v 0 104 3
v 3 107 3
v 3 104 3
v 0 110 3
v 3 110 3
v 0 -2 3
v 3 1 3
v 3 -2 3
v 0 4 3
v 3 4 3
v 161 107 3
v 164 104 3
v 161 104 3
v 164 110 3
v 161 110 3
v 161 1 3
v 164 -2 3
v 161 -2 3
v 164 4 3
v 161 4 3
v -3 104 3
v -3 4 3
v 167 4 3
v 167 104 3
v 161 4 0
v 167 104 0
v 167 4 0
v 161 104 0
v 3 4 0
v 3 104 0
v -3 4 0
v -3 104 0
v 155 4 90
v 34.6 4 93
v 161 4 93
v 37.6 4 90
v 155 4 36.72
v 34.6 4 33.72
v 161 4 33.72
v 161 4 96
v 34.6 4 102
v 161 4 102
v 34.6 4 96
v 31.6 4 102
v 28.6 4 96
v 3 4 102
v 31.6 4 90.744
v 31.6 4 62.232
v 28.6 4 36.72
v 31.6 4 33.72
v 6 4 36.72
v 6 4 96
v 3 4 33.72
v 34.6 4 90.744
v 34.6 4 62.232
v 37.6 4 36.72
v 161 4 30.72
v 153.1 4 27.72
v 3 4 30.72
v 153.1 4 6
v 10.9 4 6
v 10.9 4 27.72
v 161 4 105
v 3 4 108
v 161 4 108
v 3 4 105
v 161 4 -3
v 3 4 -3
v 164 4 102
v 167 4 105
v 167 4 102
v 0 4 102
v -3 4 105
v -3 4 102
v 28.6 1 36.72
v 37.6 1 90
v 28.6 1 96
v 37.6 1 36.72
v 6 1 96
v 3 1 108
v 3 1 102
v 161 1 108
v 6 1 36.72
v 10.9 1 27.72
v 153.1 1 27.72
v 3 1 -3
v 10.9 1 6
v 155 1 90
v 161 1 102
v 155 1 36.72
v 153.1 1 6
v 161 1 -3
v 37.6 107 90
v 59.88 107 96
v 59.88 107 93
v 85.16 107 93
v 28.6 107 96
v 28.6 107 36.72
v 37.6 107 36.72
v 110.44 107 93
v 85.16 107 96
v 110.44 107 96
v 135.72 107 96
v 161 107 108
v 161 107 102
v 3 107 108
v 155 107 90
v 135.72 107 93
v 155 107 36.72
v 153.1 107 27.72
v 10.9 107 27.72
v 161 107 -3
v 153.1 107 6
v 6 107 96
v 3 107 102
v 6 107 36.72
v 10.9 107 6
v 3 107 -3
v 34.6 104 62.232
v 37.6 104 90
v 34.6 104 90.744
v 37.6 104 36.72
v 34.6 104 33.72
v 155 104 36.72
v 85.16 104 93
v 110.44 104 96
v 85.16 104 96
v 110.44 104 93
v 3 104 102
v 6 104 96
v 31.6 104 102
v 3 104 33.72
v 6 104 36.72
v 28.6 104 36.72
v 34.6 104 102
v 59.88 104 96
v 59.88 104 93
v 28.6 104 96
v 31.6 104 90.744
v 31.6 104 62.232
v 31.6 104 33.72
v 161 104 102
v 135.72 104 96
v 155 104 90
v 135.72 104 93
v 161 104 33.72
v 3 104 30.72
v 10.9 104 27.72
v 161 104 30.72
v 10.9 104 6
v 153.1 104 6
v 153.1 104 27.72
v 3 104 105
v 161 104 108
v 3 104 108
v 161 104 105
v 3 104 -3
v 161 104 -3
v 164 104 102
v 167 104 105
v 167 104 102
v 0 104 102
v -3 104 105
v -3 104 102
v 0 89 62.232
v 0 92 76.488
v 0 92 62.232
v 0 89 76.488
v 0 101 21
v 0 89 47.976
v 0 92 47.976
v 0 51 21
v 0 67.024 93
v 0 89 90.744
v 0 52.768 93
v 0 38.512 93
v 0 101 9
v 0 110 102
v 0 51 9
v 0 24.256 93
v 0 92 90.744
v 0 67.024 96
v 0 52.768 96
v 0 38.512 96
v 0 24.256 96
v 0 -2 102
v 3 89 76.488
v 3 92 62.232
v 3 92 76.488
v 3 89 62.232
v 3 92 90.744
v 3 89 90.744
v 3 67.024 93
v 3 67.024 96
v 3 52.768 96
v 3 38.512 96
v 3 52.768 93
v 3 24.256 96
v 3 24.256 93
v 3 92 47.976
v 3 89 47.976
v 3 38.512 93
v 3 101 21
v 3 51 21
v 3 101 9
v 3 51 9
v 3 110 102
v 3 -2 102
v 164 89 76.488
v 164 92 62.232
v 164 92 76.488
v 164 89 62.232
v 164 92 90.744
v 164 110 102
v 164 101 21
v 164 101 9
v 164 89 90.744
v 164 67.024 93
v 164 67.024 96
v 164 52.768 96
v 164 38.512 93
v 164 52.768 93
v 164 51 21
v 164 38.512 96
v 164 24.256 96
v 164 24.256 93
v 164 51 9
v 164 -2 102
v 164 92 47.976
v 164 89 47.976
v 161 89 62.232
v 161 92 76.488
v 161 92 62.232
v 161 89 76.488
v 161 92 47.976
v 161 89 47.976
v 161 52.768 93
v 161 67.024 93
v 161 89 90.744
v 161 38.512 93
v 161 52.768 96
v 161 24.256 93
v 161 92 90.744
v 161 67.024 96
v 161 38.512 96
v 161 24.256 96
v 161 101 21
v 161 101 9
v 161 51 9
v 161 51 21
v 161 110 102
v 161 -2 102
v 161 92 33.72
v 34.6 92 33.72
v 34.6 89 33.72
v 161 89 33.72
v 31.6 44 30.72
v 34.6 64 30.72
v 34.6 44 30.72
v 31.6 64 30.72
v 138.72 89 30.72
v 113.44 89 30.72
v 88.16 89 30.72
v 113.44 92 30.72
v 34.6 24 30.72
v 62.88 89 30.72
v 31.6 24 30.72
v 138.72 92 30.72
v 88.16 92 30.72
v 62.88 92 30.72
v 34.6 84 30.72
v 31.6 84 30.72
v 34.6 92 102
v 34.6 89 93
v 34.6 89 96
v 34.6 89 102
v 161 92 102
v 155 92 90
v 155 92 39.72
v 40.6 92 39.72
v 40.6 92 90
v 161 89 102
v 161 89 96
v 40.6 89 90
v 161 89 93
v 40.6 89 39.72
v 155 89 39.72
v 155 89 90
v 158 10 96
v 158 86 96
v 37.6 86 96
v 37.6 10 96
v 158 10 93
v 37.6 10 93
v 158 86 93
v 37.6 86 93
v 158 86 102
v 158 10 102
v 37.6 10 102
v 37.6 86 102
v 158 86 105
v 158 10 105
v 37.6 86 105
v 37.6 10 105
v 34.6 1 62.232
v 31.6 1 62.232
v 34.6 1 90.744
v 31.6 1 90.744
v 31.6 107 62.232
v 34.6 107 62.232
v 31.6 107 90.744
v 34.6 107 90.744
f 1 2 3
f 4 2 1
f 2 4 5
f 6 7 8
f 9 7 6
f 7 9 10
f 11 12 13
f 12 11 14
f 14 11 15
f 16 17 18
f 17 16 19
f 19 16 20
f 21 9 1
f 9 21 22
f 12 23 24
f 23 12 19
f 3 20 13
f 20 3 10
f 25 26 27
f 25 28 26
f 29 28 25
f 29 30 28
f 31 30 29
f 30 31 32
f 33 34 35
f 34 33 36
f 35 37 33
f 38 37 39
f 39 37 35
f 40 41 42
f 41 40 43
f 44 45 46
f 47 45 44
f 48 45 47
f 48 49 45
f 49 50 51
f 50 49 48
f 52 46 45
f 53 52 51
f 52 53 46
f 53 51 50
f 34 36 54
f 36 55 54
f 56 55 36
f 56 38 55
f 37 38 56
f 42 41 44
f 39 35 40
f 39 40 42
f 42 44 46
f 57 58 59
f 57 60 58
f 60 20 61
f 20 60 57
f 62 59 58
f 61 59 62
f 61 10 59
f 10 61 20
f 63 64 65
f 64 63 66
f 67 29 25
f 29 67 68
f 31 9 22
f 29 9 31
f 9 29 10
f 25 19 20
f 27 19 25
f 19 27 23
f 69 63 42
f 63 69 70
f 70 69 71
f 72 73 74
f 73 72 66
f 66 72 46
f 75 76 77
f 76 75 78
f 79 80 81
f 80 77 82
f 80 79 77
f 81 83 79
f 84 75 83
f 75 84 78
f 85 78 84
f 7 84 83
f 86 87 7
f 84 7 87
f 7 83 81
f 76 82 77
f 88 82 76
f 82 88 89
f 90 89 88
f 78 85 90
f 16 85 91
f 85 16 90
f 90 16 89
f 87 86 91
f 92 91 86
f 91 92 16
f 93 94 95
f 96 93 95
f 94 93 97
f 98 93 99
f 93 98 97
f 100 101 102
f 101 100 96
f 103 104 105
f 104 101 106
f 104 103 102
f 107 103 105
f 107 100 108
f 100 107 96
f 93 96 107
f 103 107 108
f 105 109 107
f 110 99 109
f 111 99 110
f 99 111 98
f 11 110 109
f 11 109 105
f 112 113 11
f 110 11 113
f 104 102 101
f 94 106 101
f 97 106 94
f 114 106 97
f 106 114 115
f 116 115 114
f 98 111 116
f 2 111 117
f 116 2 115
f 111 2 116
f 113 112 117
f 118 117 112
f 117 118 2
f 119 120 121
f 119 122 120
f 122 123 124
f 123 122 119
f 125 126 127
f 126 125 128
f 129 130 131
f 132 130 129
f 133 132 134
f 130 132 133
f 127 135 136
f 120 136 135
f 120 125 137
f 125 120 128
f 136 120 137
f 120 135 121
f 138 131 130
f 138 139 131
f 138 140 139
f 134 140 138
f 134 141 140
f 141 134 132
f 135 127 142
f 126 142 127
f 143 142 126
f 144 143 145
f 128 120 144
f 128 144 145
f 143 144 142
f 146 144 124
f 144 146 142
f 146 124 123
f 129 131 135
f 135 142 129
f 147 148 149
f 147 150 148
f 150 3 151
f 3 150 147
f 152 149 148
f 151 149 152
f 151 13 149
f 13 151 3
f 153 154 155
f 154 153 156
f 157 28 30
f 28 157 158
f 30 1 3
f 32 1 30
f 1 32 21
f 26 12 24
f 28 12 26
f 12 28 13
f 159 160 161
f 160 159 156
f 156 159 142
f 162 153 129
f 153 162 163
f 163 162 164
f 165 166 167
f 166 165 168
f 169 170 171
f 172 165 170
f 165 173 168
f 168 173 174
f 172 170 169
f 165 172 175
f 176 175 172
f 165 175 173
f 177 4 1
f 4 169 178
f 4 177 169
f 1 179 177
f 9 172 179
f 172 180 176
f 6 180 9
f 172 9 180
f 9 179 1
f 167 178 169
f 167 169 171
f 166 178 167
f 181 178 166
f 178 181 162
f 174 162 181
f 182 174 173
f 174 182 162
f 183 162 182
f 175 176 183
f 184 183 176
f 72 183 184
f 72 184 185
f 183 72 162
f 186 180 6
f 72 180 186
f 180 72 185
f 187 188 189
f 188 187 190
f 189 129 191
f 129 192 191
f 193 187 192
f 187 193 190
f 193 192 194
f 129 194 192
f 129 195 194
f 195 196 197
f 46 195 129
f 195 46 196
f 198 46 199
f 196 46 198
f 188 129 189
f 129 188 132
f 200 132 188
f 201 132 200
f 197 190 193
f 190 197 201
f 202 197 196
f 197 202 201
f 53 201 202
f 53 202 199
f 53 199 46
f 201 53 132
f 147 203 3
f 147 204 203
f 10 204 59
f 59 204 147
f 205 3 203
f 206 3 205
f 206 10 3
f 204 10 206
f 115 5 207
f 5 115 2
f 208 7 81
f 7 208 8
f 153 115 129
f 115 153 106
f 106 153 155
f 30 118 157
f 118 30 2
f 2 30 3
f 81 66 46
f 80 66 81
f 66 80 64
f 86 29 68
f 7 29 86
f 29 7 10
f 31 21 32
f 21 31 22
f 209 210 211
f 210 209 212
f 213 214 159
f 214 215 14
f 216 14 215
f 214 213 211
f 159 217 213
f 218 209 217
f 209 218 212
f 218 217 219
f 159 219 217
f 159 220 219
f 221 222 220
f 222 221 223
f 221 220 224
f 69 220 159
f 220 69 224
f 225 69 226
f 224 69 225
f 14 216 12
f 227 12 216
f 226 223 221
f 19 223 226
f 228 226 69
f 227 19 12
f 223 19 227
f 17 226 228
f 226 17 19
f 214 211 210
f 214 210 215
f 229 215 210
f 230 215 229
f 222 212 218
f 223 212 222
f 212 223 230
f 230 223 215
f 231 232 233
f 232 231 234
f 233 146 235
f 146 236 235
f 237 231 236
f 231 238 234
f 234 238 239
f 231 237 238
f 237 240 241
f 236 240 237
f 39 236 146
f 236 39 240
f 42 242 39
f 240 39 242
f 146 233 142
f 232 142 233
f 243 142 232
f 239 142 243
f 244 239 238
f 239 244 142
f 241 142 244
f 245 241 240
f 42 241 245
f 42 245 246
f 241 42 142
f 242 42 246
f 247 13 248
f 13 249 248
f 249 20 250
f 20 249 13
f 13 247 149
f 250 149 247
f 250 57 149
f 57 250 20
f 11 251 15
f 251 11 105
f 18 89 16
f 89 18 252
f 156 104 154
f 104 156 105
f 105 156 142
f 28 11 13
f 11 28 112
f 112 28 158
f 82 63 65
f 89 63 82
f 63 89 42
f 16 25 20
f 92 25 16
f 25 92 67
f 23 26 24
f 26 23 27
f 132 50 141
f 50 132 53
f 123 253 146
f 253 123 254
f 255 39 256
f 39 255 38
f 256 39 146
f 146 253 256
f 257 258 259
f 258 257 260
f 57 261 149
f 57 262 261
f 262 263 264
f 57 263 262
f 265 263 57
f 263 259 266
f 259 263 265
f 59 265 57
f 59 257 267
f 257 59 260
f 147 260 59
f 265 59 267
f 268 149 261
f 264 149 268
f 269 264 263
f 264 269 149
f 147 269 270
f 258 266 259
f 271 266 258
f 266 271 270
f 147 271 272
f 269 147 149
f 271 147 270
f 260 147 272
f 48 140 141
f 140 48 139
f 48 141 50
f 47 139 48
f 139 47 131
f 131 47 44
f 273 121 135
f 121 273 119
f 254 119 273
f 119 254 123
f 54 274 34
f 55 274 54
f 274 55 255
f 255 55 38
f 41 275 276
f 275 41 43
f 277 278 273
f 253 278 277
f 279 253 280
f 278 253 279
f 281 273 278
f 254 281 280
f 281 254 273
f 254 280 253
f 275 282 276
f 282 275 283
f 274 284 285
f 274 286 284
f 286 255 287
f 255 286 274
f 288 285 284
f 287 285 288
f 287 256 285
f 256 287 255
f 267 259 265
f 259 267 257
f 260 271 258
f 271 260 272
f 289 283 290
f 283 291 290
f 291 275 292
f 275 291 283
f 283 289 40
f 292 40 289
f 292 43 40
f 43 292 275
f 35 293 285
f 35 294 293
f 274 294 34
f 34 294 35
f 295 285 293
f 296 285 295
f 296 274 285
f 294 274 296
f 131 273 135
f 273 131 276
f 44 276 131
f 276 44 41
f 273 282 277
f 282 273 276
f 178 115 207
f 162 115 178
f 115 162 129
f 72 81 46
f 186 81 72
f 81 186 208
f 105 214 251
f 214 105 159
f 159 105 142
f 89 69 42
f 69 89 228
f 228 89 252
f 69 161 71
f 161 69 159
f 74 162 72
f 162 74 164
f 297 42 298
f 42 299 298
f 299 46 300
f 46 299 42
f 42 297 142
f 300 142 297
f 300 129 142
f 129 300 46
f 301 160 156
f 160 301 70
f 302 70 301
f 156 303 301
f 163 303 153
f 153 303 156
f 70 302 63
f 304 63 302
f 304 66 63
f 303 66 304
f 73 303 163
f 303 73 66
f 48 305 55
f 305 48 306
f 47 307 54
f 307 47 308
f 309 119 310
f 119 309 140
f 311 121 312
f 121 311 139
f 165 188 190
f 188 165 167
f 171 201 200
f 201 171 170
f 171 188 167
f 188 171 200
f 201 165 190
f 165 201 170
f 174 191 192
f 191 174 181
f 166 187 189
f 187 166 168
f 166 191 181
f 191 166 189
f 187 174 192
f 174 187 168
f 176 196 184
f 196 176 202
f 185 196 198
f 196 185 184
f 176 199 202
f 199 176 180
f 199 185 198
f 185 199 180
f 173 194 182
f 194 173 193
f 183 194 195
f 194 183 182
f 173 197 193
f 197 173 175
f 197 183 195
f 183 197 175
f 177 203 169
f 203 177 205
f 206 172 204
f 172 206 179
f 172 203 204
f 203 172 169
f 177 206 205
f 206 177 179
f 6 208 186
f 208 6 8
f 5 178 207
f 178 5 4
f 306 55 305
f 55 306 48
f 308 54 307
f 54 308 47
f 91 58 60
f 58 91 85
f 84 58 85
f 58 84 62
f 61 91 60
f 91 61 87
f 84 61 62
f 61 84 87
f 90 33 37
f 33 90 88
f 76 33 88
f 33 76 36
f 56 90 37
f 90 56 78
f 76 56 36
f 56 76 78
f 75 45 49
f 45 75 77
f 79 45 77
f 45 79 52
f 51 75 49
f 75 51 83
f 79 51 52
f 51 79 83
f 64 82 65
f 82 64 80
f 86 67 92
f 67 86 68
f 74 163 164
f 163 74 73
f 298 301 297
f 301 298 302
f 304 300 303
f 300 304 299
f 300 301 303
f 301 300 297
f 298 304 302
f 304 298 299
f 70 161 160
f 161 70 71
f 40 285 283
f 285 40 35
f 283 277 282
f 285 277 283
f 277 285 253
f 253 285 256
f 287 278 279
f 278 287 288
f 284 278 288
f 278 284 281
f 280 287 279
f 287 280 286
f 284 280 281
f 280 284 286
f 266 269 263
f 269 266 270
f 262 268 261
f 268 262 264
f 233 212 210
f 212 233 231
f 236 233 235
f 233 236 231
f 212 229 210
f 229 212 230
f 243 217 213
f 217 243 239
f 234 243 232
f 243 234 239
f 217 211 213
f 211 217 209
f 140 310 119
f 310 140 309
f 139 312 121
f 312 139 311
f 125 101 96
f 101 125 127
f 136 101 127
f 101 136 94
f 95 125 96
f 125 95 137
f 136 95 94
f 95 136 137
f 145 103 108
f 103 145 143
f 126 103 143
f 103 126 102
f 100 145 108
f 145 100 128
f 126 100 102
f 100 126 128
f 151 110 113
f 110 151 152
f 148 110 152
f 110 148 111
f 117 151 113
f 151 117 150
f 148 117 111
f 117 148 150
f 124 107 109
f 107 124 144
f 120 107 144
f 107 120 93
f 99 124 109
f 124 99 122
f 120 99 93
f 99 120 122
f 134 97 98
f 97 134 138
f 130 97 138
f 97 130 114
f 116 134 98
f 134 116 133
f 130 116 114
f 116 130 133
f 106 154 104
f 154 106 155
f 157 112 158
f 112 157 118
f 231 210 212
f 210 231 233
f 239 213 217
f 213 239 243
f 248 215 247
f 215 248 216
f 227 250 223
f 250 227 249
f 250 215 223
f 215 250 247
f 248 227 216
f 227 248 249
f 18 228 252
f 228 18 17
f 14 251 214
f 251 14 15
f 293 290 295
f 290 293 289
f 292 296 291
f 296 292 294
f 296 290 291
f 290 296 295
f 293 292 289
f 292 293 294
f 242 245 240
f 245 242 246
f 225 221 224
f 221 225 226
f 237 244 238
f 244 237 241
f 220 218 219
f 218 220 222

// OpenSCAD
module casenumber (mode,n,m,l,w,h,p1,p2,p3,t) {
    //n is the number of cases produced. m is the number of cases along the x axis. mode returns a layout for laser cutting when set to 1, a 3d case preview otherwise. p1 is the percent of the hight at which the top of the network hub is. p2 is for the side of the power hub. and p3 is for the "far" end of the pis
    module peg(z){
        //This module defines the piece we use to put in the slot to hold the case together, this module is used throughout the other modules
        translate([z/5,0,0])cube([z/5,t,t]);
        translate([3*z/5,0,0])cube([z/5,t,t]);
    }
    module slot (z){
        //This is the module that defines the part that holds the pegs to keep the case together, this module is used throughout the other modules 
        difference(){
        cube([z,2*t,t]);
        peg(z);
        }
    }
    module base(){
        //This module defines the base of the case
        translate([0,t])cube([l,w,t]);
        peg(l);
        translate([0,w+t])peg(l);
        translate ([0, t])rotate ([0, 0, 90])slot (w);
        translate ([l,t,t])rotate ([180,0,90])slot (w);
    }
    module xyinterior(){
        //This module defines the partition between the network hub and the pis and power hub
        difference(){
            translate([0,t])cube([l,w,t]);
            translate([l*p2,t]) rotate(90) peg(w);
            translate([t+l*p2,w*p3-t]) peg(l*(1-p2));
        }
        peg(l);
        translate([0,w+t])peg(l);
        translate ([0, t])rotate ([0, 0, 90])peg (w);
        translate ([l,t,t])rotate ([180,0,90]) peg(w);
    }
    module shortside(){
        //This module defines the shorter sides of the case
        difference(){
            cube([t,w,h]);
            translate([t*.5,0,h*p1]) rotate([0,0,90]) peg(w);
            translate([t*1.5,0,h*p1]) rotate([0,0,90]) peg(w);
            translate([t*.5,w*p3-2*t,h*p1+t]) rotate([0,270,0]) peg(h-h*p1);
            translate([t*1.5,w*p3-2*t,h*p1+t]) rotate([0,270,0]) peg(h-h*p1);
            translate ([0, w/2-t, 2*t])rotate ([90, 0, 90])cube ([w/2, 4*t, t*2]);
            translate ([t*.5,t*2, h-3*t])rotate ([0,0,90])peg (h-h*p1);
            translate ([t,t*2, h-3*t])rotate ([0,0,90])peg (h-h*p1);
        }
        rotate([180,0,90]) peg(w);
        translate([0,0,h+t]) rotate([180,0,90]) peg(w);
        rotate([0,-90,180]) slot(h);
        translate([t,w,0]) rotate([0,-90,0]) slot(h);
    }
    module yzinterior(){
        //This module defines the part used to separate the pis and the power hub
        difference () {
        cube([t,w,h*(1-p1)-t]);
        translate([t*.5,w*p3-2*t,0]) rotate ([0,-90,0])peg(h*(1-p1));
        translate([t*1.5,w*p3-2*t,0]) rotate ([0,-90,0])peg(h*(1-p1));
            translate ([t,t*2, h*(1-p1)-4*t])rotate ([0,0,90])peg (h-h*p1);
            translate ([0,t*2, h*(1-p1)-4*t])rotate ([0,0,90])peg (h-h*p1);
        }
        rotate([180,0,90]) peg(w);
        translate([0,0,h*(1-p1)]) rotate([180,0,90]) peg(w);
        rotate([0,-90,180]) peg(h*(1-p1));
        translate([0,w+t]) rotate([0,-90,180]) peg(h*(1-p1));
    }
    module longside(){
        //This module defines one of the longer sides of the case that has port holes for the ports on the pis
        difference(){
            cube([l,t,h]);
            translate([0,0,h*p1]) peg(l);
            translate([l*p2,0,h*p1+t]) rotate([0,-90,0]) peg(h*(1-p1));
            translate([l*.05, 0, t])cube ([l*.9,t,h*p1-2*t]);
            translate([l*p2+t, 0,h*p1+2*t])cube ([l*(1-p2)-3*t, t, h*(1-p1)-6*t]);
            translate([t, 0, h*p1+2*t])cube ([l*(p2)-3*t, t, h*(1-p1)-4*t]);
            translate ([p2*l, 0, h-3*t]) peg(l-l*p2);
        }
        translate([0,t,h])rotate ([90,0,0])slot(l);
        rotate([0,-90])peg(h);
        translate([l+t,0,0])rotate([0,-90])peg(h);
        rotate([-90,0,0]) slot(l);
        
    }
    module xzinterior(){
        //This is used to secure the pis in the case
        difference(){
            translate([0,-t,0])cube([l*(1-p2),t,h*(1-p1)-t]);
            translate([2*t,-t,2*t]) cube([l*(1-p2)-4*t,t,h*(1-p1)-7*t]);
            translate ([0, -t, h-h*p1-4*t]) peg(l-l*p2);
        }
        rotate([180,0,0]) translate([t,0,0])peg(l*(1-p2));
        translate([t,0,h*(1-p1)]) rotate([180,0,0]) peg(l*(1-p2));
        rotate([0,-90,90])peg(h*(1-p1));
        translate([l*(1-p2)+t,-t]) rotate([0, -90,0]) peg(h*(1-p1));
    }
    module top(){
        //This is the module that defines the top of the case and holds the case together
        difference(){
            cube([l,w,t]);
            translate([l*p2,0]) rotate(90) peg(w);
            translate([t+l*p2,w*p3-2*t]) peg(l*(1-p2));
            translate([l*p2+t,2*t,0])cube ([l*(1-p2)-2*t, w*p3-5*t, t]);
        }
        translate ([0, 0, t]) rotate([180, 0, 0])peg (l);
        translate ([0, w, 0])peg (l);
        rotate ([0, 0, 90])slot (w);
        translate([l, 0, t])rotate ([180, 0, 90])slot (w);
    }
    module pitop() {
        //This piece holds the pis in place vertically
        difference () {
        cube ([l*(1-p2), w*p3-2*t, t]);
        translate([t,2*t,0])cube ([l*(1-p2)-2*t, w*p3-5*t, t]);
        }
        translate([0, -1*t, 0]) rotate ([0, 0, 0])peg (l*(1-p2));
        translate([0, w-5*t, 0]) rotate ([0, 0, 0])peg (l*(1-p2));
        translate ([0,t*2,0])rotate ([0,0,90])peg (h-h*p1);
            translate ([l*(1-p2)+t,t*2,0])rotate ([0,0,90])peg (h-h*p1);
    }
module case(){
    //This section ligns up all of the pieces to be cut
    translate([t,0,0]) base();
    translate([0,l-w*.25,0]) xyinterior();
    translate([2*l+w*.5-2*t,t,0]) rotate([0, 90, 0])yzinterior();
    translate([l+w*.25,2*l-.5*w+2*t,0]) rotate([0, 90, 0]) shortside();
    translate([1.5*l-.5*w,l+.75*w,0])rotate([90, 0, 0]) longside();
    translate([l*1.5-w*.5,t*2,0]) top();
    translate ([2*l+.5*w-2*t,w*1.25,0])rotate([90,0,90])xzinterior ();
    translate([0,2*l-w*.5+2*t,0])rotate([-90, 0, 0])longside();
    mirror([0, 180, 0])translate([2*l, -2*l-w*.5-2*t, 0])rotate([0, 90, 0])shortside();
    translate ([3*l+w*.5, 0, 0]) rotate (90,0,0)pitop();
}
    if (mode==1){
        if (n>0) {
            projection () translate([t+(w+2*l+w*.5+h*(1-p1))*((n-1)%m),(2*l-w/2+h+5*t)*floor((n-1)/m),t]) case();
            casenumber(1,n-1,m,l,w,h,p1,p2,p3,t);
        }
    }
    else{
        //This section ligns up all of the pieces so they look how they will when the case is put together
    translate([t,0,0]) base();
    translate([t,0,h*p1+t]) xyinterior();
    color("red") translate([l*p2,t,h*p1+2*t]) yzinterior();
    translate([0,t,t]) color("red") shortside();
    translate([t,0,t])color("blue") longside();
    translate([t,t,h+t]) top();
    color("blue") translate ([t+l*p2,w*p3,h*p1+2*t])xzinterior ();
    translate([t,w+t,t])longside();
    color("red") translate([t+l, t, t])shortside();
    translate ([l*p2+t, t, h-2*t])pitop ();
    }
}
translate([0,1]) casenumber(0,1,4,158,100,99,.28,.20,.91,3);
